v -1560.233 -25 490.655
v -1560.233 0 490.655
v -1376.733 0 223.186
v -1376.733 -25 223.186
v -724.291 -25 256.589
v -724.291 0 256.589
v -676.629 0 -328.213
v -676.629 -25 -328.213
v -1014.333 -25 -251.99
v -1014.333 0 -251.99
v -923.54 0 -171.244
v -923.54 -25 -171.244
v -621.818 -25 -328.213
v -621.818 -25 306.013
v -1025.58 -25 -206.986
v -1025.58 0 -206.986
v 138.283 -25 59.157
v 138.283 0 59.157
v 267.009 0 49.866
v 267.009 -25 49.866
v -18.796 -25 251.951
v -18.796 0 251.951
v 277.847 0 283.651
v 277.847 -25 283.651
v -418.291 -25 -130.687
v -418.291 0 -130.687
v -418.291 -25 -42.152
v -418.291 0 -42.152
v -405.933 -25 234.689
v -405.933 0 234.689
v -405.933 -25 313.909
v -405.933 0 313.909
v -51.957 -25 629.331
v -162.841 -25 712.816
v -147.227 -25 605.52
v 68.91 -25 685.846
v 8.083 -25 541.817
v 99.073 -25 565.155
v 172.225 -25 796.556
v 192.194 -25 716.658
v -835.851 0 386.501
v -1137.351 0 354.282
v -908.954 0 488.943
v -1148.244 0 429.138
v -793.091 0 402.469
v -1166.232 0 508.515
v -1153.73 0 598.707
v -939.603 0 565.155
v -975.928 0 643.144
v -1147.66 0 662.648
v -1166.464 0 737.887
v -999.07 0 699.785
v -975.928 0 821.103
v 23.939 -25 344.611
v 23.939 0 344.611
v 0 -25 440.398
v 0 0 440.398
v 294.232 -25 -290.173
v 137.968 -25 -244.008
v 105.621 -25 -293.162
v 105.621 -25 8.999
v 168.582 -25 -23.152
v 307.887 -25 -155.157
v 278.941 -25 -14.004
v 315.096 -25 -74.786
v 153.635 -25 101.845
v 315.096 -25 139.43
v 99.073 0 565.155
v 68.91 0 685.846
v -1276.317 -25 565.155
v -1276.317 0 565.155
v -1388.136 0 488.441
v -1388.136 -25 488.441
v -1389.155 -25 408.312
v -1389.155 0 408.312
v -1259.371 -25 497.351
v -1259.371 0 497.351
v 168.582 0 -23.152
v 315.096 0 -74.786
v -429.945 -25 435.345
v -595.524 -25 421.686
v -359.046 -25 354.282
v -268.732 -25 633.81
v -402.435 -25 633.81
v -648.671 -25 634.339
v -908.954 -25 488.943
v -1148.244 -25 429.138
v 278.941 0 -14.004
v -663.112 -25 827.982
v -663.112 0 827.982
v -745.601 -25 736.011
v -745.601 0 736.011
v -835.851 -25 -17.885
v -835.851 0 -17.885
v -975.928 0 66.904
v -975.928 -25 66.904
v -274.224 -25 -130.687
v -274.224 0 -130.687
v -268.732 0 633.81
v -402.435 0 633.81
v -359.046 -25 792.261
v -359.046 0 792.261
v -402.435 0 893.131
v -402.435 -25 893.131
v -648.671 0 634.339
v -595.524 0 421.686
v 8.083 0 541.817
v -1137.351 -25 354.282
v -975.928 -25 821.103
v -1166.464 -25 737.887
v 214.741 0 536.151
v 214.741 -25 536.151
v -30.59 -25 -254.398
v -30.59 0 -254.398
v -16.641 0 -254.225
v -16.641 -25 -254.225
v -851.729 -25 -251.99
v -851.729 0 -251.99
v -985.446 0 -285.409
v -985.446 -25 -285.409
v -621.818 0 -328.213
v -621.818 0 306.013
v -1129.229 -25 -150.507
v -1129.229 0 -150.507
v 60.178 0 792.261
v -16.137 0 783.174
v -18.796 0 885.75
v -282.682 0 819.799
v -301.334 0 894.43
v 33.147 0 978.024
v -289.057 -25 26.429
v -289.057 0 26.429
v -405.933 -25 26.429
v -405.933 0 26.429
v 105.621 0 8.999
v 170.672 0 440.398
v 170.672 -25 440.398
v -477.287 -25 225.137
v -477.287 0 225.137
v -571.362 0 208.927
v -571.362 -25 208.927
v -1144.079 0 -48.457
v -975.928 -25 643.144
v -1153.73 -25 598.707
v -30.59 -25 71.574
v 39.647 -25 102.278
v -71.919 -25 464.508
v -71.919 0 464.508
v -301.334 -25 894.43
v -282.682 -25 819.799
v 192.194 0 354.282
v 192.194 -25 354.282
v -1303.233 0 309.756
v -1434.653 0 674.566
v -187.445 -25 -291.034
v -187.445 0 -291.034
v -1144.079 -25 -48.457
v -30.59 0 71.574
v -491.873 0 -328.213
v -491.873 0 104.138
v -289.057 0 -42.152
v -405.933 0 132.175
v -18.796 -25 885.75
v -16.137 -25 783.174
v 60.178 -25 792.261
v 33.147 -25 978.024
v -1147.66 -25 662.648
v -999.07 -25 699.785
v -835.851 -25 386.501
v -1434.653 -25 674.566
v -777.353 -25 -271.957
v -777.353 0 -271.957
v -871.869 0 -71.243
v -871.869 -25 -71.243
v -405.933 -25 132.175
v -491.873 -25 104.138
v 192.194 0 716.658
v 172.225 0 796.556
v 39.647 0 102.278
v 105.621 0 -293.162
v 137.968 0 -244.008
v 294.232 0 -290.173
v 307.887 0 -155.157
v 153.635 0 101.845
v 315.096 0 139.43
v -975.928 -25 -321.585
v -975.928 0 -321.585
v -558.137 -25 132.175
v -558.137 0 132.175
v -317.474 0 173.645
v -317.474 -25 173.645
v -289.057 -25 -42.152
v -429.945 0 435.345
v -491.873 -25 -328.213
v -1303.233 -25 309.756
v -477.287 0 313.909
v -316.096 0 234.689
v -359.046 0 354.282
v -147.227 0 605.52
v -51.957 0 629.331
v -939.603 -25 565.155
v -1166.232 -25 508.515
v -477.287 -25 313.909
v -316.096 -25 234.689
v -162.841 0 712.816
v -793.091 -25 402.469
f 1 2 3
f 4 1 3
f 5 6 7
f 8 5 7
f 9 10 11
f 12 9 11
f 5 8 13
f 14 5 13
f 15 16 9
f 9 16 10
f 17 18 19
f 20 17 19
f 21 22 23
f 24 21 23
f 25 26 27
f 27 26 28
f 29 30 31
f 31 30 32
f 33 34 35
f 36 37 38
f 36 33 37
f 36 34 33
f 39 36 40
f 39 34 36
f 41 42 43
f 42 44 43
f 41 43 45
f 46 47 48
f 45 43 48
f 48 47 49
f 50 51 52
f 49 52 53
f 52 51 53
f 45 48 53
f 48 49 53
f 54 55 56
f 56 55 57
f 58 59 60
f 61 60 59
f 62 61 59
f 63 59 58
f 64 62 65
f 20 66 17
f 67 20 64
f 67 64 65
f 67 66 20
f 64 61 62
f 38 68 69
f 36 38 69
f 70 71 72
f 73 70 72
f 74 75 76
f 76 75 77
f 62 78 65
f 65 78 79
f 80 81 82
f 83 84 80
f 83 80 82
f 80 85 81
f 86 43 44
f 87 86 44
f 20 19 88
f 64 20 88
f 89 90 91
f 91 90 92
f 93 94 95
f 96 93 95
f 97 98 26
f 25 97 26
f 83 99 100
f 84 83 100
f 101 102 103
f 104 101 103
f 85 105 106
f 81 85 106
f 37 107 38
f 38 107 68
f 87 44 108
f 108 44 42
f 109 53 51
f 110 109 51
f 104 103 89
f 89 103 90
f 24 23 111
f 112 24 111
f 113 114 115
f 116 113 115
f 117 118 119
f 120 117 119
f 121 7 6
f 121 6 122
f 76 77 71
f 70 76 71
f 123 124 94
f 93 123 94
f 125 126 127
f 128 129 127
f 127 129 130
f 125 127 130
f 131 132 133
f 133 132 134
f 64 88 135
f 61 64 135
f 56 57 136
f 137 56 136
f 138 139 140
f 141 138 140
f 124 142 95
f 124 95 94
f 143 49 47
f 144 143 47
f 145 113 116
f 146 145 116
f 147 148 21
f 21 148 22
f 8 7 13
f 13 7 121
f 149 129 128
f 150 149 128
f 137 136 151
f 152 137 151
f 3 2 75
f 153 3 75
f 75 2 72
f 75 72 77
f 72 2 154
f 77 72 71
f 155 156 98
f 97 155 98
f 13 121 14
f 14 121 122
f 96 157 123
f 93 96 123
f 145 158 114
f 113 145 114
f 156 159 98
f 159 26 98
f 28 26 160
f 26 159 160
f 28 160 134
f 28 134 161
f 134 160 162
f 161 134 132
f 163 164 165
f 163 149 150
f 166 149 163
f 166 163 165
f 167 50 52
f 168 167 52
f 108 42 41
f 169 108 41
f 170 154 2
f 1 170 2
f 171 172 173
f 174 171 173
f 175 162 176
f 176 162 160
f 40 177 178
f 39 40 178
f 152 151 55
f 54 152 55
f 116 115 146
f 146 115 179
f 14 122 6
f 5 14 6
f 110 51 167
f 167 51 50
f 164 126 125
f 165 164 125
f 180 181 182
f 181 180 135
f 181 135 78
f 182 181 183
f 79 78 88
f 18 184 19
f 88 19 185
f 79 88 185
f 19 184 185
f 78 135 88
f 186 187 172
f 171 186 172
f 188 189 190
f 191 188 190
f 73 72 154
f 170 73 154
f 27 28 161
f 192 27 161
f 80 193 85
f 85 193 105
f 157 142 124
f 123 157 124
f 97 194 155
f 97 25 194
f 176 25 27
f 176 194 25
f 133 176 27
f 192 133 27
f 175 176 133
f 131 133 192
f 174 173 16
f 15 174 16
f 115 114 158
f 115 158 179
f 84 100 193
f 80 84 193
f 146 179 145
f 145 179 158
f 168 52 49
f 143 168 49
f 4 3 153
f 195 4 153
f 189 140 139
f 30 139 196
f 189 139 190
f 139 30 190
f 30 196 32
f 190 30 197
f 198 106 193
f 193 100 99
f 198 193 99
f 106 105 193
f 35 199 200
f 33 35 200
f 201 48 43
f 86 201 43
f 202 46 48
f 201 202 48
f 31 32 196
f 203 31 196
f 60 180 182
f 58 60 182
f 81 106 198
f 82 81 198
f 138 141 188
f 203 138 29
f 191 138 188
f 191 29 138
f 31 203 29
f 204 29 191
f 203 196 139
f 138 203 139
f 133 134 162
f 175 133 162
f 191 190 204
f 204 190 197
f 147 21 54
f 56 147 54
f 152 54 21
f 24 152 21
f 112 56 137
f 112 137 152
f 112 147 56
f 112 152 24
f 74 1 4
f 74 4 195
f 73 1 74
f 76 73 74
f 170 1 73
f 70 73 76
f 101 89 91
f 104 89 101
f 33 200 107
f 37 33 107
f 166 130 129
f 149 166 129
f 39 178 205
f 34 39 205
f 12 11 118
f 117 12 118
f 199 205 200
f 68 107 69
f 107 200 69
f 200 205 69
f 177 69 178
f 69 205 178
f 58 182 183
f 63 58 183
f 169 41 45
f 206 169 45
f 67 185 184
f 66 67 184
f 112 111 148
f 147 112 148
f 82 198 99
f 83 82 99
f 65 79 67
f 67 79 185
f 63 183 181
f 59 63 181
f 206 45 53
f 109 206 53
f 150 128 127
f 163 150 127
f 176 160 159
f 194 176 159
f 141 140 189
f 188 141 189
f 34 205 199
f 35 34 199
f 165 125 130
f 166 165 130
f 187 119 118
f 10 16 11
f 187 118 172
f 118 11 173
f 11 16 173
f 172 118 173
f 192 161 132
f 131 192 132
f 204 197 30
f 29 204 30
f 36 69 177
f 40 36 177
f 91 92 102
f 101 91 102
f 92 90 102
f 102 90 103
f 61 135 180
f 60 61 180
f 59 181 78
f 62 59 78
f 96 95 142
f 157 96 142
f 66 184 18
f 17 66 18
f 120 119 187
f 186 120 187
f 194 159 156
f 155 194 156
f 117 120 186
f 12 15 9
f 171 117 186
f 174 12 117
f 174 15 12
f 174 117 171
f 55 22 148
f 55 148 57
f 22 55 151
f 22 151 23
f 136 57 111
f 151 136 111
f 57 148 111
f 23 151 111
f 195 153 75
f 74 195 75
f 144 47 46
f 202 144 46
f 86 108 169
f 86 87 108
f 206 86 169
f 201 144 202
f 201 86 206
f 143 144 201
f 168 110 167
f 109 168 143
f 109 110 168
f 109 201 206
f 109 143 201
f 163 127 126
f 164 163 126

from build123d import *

# Parameters (mm, degrees)
F1_DEPTH = 25


with BuildPart() as f1:
    # F0 (on Front) → F1 (new body)
    with BuildSketch(Plane.XZ):
        Polygon((105.621301, -293.162137), (294.231683, -290.173262), (307.887018, -155.157492), (137.968197, -244.007826), (168.581828, -23.152474), (315.09611, -74.78606), (315.09611, 139.430016), (153.635487, 101.844788), (138.282701, 59.157178), (267.008692, 49.866036), (278.941274, -14.00375), (105.621301, 8.99884), align=None)
        Polygon((-30.590184, -254.397571), (-16.640842, -254.224986), (39.647017, 102.277629), (-30.590184, 71.574166), align=None)
        Polygon((-985.445756, -285.408615), (-975.928307, -321.585357), (-777.352631, -271.956589), (-871.86873, -71.242757), (-1025.580049, -206.985906), (-1014.332558, -251.989603), (-923.539996, -171.243623), (-851.728901, -251.989603), align=None)
        Polygon((-1129.229069, -150.507167), (-835.851073, -17.885055), (-975.928307, 66.904081), (-1144.078903, -48.457111), align=None)
        Polygon((-18.795855, 251.951051), (277.846664, 283.651084), (214.740997, 536.15081), (-71.918808, 464.507729), align=None)
        Polygon((170.671704, 440.397514), (192.194074, 354.281753), (23.939335, 344.610943), (0, 440.397514), align=None, mode=Mode.SUBTRACT)
        Polygon((8.083211, 541.816705), (99.073119, 565.155447), (68.909717, 685.845888), (192.194074, 716.657571), (172.225441, 796.556489), (-162.84059, 712.815545), (-147.227491, 605.520232), (-51.956535, 629.330702), align=None)
        Polygon((-16.137393, 783.173793), (60.178287, 792.261004), (33.146898, 978.024338), (-301.334083, 894.429612), (-282.682138, 819.799055), (-18.795855, 885.750493), align=None)
        Polygon((-595.524126, 421.685743), (-359.045684, 354.281753), (-268.732198, 633.809626), (-402.434884, 633.809626), (-429.944811, 435.345269), (-648.671329, 634.339452), align=None)
        Polygon((-745.600795, 736.011359), (-359.045684, 792.261004), (-402.434884, 893.130963), (-663.111687, 827.981651), align=None)
        Polygon((-1137.351035, 354.281753), (-835.851073, 386.500865), (-793.0909, 402.468556), (-975.928307, 821.102917), (-1166.464244, 737.88687), (-1147.660359, 662.64837), (-999.070329, 699.784541), (-975.928307, 643.143624), (-1153.73037, 598.706674), (-1166.232145, 508.515347), (-939.602584, 565.155447), (-908.953777, 488.942523), (-1148.243797, 429.138274), align=None)
        Polygon((-1303.233027, 309.756249), (-1389.154553, 408.312052), (-1259.37099, 497.351205), (-1276.316877, 565.155447), (-1388.136205, 488.440816), (-1434.653334, 674.566133), (-1560.23252, 490.654618), (-1376.733401, 223.186105), align=None)
        Polygon((-491.873384, -328.212827), (-187.444955, -291.033775), (-274.22446, -130.68676), (-418.290883, -130.68676), (-418.290883, -42.152181), (-289.057046, -42.152181), (-289.057046, 26.428942), (-405.933231, 26.428942), (-405.933231, 132.17473), (-491.873384, 104.13821), align=None)
        Polygon((-558.13694, 132.17473), (-317.47368, 173.644617), (-316.09568, 234.689221), (-405.933231, 234.689221), (-405.933231, 313.908696), (-477.286965, 313.908696), (-477.286965, 225.137115), (-571.362421, 208.926504), align=None)
        Polygon((-676.629066, -328.212827), (-621.818483, -328.212827), (-621.818483, 306.012601), (-724.290848, 256.589144), align=None)
    extrude(amount=F1_DEPTH)


solid = f1.part
